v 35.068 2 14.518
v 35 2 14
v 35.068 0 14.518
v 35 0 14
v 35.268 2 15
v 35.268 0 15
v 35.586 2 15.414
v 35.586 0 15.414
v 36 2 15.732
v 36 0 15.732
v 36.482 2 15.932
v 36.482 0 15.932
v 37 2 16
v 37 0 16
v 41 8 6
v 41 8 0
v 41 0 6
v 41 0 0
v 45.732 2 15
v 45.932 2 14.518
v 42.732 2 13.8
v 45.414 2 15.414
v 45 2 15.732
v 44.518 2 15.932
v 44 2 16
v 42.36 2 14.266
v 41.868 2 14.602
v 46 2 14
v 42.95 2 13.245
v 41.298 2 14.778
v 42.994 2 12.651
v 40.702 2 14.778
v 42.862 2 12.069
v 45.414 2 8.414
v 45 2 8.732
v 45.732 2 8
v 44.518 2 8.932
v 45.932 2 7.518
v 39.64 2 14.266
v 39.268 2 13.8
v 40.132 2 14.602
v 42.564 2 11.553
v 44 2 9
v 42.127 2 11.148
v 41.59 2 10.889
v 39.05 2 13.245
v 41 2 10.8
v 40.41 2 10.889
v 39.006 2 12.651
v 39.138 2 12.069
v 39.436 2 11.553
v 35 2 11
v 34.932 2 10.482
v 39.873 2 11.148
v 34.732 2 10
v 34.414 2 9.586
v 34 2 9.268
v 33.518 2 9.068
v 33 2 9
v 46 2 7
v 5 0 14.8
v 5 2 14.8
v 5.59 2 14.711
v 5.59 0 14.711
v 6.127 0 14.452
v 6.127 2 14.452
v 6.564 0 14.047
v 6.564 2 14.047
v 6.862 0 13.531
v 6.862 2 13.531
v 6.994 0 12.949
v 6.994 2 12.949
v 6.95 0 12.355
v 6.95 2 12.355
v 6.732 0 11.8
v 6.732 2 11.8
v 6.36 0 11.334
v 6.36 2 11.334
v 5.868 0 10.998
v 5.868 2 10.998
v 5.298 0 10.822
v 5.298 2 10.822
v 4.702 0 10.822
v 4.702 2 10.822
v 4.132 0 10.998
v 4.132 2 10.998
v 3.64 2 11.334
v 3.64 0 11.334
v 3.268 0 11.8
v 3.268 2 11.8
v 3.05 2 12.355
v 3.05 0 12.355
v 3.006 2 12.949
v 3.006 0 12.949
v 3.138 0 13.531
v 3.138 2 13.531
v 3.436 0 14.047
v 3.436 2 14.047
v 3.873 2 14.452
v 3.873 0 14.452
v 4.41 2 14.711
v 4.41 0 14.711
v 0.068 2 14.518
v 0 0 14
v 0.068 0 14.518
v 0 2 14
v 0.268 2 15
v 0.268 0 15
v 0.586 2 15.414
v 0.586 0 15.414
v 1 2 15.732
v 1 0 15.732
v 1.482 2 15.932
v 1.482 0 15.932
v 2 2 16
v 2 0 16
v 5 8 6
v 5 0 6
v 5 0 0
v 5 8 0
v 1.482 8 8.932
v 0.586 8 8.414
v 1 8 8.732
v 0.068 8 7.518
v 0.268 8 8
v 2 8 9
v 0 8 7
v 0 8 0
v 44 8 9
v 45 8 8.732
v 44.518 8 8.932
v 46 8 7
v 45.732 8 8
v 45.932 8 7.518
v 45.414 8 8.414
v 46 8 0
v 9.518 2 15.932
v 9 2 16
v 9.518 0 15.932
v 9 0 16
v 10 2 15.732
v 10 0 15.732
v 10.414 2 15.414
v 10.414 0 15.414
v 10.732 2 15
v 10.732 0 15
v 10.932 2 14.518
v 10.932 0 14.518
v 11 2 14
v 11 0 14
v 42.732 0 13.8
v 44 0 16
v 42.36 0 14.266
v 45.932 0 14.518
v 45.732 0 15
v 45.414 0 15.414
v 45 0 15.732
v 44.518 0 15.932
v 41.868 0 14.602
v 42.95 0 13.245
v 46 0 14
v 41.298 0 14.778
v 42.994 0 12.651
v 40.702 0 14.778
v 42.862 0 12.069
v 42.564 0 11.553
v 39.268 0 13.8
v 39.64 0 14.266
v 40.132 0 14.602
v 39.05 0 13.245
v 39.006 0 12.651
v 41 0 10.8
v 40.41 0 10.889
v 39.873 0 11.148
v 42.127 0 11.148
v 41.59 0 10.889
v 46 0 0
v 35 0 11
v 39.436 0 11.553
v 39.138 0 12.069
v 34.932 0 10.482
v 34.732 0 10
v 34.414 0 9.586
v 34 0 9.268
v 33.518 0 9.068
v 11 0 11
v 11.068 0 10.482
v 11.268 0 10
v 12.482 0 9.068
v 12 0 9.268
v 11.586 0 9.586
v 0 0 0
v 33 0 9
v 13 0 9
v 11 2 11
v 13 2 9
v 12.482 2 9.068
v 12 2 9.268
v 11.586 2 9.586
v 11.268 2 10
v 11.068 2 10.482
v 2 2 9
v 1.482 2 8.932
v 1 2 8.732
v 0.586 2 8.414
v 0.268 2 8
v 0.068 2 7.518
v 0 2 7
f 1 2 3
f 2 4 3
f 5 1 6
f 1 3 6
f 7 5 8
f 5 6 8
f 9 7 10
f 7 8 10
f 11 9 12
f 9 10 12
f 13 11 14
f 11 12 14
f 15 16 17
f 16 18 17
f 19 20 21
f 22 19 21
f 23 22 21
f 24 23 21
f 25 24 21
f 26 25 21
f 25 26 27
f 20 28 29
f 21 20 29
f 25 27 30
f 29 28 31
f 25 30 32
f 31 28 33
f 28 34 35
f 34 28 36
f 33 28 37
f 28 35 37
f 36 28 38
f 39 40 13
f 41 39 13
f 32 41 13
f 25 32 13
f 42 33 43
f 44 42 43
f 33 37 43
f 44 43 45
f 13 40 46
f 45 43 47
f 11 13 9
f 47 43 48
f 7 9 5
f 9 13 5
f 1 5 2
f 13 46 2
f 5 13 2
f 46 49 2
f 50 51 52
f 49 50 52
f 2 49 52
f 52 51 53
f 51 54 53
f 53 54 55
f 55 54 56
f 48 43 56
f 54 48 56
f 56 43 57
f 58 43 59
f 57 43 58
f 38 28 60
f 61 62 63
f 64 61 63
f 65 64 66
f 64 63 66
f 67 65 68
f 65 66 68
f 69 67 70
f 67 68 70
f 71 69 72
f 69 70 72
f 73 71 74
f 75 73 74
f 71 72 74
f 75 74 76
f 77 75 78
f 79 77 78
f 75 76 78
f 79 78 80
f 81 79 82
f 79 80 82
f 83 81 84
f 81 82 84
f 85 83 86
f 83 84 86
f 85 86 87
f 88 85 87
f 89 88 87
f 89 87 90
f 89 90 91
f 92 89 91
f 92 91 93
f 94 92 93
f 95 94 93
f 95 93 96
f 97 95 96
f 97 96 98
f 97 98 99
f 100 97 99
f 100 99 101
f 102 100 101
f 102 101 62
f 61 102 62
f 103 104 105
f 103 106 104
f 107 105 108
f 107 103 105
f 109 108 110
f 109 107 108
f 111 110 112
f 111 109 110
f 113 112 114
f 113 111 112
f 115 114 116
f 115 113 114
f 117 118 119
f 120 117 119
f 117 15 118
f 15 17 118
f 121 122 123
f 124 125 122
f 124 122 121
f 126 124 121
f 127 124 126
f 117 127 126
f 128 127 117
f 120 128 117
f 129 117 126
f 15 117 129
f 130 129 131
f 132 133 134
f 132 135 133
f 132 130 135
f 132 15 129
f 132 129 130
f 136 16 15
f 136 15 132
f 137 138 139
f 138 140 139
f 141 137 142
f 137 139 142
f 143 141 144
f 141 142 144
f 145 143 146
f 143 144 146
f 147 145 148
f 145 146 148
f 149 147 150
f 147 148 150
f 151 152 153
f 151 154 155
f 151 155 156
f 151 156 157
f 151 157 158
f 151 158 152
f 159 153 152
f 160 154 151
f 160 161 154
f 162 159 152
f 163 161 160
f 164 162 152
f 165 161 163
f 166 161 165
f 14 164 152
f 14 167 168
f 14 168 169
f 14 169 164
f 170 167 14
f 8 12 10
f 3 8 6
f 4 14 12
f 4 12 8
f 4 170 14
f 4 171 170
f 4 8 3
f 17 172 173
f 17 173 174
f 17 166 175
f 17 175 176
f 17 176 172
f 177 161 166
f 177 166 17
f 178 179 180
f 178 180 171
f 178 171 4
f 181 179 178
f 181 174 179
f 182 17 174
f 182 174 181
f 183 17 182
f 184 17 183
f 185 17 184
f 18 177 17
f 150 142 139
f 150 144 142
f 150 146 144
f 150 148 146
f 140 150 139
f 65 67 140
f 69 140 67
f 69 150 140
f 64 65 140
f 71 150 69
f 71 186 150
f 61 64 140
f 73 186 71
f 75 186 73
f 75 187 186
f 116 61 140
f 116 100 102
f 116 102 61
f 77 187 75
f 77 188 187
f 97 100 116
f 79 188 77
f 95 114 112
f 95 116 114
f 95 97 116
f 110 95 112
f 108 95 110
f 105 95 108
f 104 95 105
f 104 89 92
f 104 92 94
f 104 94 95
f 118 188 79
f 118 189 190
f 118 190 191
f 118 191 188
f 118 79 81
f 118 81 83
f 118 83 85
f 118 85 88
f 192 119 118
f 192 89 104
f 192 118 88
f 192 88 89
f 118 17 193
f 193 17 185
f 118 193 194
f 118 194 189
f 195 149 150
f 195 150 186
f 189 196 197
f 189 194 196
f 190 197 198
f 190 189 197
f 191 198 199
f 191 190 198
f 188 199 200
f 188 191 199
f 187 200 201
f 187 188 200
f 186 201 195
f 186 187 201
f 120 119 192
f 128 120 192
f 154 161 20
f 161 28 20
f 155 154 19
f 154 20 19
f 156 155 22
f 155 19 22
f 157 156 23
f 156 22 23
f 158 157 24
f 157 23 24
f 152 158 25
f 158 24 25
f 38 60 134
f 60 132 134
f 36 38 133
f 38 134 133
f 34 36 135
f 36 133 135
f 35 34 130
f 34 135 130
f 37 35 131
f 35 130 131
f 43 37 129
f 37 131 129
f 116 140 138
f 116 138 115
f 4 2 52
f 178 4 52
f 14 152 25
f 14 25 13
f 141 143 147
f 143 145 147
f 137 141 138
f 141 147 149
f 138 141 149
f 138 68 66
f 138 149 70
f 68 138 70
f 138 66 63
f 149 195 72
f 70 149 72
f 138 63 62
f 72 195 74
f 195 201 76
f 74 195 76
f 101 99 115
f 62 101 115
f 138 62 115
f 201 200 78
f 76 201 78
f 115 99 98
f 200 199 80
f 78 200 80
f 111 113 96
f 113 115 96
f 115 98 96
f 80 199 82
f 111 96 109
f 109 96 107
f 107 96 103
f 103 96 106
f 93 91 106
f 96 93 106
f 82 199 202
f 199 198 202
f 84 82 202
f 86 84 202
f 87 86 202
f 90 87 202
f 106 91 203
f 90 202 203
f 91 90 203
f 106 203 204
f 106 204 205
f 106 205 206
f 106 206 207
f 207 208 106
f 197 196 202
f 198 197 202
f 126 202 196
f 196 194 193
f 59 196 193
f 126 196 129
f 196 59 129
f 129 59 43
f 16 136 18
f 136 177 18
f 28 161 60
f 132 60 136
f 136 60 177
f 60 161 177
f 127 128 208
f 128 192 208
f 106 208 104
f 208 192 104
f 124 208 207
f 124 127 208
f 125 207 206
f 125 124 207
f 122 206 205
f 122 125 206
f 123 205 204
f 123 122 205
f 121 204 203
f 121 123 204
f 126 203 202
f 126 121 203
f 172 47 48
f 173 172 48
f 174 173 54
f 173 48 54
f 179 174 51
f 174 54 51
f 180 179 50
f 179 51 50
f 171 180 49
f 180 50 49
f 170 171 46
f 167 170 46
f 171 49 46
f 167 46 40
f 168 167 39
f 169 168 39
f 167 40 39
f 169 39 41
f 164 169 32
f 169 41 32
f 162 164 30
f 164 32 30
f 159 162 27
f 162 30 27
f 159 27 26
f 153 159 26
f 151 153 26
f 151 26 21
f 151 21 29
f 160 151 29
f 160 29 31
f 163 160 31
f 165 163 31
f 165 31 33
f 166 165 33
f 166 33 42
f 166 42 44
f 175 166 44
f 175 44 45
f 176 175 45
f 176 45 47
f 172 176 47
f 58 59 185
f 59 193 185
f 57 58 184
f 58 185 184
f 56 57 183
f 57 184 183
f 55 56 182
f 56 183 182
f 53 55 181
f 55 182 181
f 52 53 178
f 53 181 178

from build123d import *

# Parameters (mm, degrees)
BOSS_EXTRUDE1_DEPTH = 2
BOSS_EXTRUDE2_DEPTH = 6
FILLET1_R           = 2
SKETCH4_R           = 2
CUT_EXTRUDE1_DEPTH  = 50.071376586
SKETCH7_W           = 24
SKETCH7_H           = 7
CUT_EXTRUDE2_DEPTH  = 50.071376586
FILLET2_R           = 2


with BuildPart() as part:
    # Sketch1 → Boss-Extrude1 (new body)
    with BuildSketch(Plane(origin=(0, 0, 0), x_dir=(1, 0, 0), z_dir=(0, 1, 0))):
        Polygon((0, 0), (5, 0), (5, -6), (41, -6), (41, 0), (46, 0), (46, -16), (0, -16), align=None)
    extrude(amount=BOSS_EXTRUDE1_DEPTH)

    # Sketch2 → Boss-Extrude2 (add)
    with BuildSketch(Plane(origin=(0, 2, 0), x_dir=(1, 0, 0), z_dir=(0, 1, 0))):
        Polygon((0, 0), (0, -9), (46, -9), (46, 0), (41, 0), (41, -6), (5, -6), (5, 0), align=None)
    extrude(amount=BOSS_EXTRUDE2_DEPTH)

    # Fillet1
    fillet1_edges = [part.edges().sort_by_distance(p)[0] for p in [
        (46, 1, 16),
        (0, 1, 16),
        (0, 5, 9),
        (46, 5, 9),
    ]]
    fillet(fillet1_edges, radius=FILLET1_R)

    # Sketch4 → Cut-Extrude1 (cut, through all)
    with BuildSketch(Plane(origin=(0, 2, 0), x_dir=(1, 0, 0), z_dir=(0, 1, 0))):
        with Locations(Location((5, -12.8, 0), (0, 0, 270))):
            Circle(SKETCH4_R)
        with Locations(Location((41, -12.8, 0), (0, 0, 90))):
            Circle(SKETCH4_R)
    extrude(amount=-CUT_EXTRUDE1_DEPTH, mode=Mode.SUBTRACT)

    # Sketch7 → Cut-Extrude2 (cut, through all)
    with BuildSketch(Plane(origin=(0, 2, 0), x_dir=(1, 0, 0), z_dir=(0, 1, 0))):
        with Locations((23, -12.5)):
            Rectangle(SKETCH7_W, SKETCH7_H)
    extrude(amount=-CUT_EXTRUDE2_DEPTH, mode=Mode.SUBTRACT)

    # Fillet2
    fillet2_edges = [part.edges().sort_by_distance(p)[0] for p in [
        (35, 1, 16),
        (11, 1, 16),
        (11, 1, 9),
        (35, 1, 9),
    ]]
    fillet(fillet2_edges, radius=FILLET2_R)


solid = part.part
